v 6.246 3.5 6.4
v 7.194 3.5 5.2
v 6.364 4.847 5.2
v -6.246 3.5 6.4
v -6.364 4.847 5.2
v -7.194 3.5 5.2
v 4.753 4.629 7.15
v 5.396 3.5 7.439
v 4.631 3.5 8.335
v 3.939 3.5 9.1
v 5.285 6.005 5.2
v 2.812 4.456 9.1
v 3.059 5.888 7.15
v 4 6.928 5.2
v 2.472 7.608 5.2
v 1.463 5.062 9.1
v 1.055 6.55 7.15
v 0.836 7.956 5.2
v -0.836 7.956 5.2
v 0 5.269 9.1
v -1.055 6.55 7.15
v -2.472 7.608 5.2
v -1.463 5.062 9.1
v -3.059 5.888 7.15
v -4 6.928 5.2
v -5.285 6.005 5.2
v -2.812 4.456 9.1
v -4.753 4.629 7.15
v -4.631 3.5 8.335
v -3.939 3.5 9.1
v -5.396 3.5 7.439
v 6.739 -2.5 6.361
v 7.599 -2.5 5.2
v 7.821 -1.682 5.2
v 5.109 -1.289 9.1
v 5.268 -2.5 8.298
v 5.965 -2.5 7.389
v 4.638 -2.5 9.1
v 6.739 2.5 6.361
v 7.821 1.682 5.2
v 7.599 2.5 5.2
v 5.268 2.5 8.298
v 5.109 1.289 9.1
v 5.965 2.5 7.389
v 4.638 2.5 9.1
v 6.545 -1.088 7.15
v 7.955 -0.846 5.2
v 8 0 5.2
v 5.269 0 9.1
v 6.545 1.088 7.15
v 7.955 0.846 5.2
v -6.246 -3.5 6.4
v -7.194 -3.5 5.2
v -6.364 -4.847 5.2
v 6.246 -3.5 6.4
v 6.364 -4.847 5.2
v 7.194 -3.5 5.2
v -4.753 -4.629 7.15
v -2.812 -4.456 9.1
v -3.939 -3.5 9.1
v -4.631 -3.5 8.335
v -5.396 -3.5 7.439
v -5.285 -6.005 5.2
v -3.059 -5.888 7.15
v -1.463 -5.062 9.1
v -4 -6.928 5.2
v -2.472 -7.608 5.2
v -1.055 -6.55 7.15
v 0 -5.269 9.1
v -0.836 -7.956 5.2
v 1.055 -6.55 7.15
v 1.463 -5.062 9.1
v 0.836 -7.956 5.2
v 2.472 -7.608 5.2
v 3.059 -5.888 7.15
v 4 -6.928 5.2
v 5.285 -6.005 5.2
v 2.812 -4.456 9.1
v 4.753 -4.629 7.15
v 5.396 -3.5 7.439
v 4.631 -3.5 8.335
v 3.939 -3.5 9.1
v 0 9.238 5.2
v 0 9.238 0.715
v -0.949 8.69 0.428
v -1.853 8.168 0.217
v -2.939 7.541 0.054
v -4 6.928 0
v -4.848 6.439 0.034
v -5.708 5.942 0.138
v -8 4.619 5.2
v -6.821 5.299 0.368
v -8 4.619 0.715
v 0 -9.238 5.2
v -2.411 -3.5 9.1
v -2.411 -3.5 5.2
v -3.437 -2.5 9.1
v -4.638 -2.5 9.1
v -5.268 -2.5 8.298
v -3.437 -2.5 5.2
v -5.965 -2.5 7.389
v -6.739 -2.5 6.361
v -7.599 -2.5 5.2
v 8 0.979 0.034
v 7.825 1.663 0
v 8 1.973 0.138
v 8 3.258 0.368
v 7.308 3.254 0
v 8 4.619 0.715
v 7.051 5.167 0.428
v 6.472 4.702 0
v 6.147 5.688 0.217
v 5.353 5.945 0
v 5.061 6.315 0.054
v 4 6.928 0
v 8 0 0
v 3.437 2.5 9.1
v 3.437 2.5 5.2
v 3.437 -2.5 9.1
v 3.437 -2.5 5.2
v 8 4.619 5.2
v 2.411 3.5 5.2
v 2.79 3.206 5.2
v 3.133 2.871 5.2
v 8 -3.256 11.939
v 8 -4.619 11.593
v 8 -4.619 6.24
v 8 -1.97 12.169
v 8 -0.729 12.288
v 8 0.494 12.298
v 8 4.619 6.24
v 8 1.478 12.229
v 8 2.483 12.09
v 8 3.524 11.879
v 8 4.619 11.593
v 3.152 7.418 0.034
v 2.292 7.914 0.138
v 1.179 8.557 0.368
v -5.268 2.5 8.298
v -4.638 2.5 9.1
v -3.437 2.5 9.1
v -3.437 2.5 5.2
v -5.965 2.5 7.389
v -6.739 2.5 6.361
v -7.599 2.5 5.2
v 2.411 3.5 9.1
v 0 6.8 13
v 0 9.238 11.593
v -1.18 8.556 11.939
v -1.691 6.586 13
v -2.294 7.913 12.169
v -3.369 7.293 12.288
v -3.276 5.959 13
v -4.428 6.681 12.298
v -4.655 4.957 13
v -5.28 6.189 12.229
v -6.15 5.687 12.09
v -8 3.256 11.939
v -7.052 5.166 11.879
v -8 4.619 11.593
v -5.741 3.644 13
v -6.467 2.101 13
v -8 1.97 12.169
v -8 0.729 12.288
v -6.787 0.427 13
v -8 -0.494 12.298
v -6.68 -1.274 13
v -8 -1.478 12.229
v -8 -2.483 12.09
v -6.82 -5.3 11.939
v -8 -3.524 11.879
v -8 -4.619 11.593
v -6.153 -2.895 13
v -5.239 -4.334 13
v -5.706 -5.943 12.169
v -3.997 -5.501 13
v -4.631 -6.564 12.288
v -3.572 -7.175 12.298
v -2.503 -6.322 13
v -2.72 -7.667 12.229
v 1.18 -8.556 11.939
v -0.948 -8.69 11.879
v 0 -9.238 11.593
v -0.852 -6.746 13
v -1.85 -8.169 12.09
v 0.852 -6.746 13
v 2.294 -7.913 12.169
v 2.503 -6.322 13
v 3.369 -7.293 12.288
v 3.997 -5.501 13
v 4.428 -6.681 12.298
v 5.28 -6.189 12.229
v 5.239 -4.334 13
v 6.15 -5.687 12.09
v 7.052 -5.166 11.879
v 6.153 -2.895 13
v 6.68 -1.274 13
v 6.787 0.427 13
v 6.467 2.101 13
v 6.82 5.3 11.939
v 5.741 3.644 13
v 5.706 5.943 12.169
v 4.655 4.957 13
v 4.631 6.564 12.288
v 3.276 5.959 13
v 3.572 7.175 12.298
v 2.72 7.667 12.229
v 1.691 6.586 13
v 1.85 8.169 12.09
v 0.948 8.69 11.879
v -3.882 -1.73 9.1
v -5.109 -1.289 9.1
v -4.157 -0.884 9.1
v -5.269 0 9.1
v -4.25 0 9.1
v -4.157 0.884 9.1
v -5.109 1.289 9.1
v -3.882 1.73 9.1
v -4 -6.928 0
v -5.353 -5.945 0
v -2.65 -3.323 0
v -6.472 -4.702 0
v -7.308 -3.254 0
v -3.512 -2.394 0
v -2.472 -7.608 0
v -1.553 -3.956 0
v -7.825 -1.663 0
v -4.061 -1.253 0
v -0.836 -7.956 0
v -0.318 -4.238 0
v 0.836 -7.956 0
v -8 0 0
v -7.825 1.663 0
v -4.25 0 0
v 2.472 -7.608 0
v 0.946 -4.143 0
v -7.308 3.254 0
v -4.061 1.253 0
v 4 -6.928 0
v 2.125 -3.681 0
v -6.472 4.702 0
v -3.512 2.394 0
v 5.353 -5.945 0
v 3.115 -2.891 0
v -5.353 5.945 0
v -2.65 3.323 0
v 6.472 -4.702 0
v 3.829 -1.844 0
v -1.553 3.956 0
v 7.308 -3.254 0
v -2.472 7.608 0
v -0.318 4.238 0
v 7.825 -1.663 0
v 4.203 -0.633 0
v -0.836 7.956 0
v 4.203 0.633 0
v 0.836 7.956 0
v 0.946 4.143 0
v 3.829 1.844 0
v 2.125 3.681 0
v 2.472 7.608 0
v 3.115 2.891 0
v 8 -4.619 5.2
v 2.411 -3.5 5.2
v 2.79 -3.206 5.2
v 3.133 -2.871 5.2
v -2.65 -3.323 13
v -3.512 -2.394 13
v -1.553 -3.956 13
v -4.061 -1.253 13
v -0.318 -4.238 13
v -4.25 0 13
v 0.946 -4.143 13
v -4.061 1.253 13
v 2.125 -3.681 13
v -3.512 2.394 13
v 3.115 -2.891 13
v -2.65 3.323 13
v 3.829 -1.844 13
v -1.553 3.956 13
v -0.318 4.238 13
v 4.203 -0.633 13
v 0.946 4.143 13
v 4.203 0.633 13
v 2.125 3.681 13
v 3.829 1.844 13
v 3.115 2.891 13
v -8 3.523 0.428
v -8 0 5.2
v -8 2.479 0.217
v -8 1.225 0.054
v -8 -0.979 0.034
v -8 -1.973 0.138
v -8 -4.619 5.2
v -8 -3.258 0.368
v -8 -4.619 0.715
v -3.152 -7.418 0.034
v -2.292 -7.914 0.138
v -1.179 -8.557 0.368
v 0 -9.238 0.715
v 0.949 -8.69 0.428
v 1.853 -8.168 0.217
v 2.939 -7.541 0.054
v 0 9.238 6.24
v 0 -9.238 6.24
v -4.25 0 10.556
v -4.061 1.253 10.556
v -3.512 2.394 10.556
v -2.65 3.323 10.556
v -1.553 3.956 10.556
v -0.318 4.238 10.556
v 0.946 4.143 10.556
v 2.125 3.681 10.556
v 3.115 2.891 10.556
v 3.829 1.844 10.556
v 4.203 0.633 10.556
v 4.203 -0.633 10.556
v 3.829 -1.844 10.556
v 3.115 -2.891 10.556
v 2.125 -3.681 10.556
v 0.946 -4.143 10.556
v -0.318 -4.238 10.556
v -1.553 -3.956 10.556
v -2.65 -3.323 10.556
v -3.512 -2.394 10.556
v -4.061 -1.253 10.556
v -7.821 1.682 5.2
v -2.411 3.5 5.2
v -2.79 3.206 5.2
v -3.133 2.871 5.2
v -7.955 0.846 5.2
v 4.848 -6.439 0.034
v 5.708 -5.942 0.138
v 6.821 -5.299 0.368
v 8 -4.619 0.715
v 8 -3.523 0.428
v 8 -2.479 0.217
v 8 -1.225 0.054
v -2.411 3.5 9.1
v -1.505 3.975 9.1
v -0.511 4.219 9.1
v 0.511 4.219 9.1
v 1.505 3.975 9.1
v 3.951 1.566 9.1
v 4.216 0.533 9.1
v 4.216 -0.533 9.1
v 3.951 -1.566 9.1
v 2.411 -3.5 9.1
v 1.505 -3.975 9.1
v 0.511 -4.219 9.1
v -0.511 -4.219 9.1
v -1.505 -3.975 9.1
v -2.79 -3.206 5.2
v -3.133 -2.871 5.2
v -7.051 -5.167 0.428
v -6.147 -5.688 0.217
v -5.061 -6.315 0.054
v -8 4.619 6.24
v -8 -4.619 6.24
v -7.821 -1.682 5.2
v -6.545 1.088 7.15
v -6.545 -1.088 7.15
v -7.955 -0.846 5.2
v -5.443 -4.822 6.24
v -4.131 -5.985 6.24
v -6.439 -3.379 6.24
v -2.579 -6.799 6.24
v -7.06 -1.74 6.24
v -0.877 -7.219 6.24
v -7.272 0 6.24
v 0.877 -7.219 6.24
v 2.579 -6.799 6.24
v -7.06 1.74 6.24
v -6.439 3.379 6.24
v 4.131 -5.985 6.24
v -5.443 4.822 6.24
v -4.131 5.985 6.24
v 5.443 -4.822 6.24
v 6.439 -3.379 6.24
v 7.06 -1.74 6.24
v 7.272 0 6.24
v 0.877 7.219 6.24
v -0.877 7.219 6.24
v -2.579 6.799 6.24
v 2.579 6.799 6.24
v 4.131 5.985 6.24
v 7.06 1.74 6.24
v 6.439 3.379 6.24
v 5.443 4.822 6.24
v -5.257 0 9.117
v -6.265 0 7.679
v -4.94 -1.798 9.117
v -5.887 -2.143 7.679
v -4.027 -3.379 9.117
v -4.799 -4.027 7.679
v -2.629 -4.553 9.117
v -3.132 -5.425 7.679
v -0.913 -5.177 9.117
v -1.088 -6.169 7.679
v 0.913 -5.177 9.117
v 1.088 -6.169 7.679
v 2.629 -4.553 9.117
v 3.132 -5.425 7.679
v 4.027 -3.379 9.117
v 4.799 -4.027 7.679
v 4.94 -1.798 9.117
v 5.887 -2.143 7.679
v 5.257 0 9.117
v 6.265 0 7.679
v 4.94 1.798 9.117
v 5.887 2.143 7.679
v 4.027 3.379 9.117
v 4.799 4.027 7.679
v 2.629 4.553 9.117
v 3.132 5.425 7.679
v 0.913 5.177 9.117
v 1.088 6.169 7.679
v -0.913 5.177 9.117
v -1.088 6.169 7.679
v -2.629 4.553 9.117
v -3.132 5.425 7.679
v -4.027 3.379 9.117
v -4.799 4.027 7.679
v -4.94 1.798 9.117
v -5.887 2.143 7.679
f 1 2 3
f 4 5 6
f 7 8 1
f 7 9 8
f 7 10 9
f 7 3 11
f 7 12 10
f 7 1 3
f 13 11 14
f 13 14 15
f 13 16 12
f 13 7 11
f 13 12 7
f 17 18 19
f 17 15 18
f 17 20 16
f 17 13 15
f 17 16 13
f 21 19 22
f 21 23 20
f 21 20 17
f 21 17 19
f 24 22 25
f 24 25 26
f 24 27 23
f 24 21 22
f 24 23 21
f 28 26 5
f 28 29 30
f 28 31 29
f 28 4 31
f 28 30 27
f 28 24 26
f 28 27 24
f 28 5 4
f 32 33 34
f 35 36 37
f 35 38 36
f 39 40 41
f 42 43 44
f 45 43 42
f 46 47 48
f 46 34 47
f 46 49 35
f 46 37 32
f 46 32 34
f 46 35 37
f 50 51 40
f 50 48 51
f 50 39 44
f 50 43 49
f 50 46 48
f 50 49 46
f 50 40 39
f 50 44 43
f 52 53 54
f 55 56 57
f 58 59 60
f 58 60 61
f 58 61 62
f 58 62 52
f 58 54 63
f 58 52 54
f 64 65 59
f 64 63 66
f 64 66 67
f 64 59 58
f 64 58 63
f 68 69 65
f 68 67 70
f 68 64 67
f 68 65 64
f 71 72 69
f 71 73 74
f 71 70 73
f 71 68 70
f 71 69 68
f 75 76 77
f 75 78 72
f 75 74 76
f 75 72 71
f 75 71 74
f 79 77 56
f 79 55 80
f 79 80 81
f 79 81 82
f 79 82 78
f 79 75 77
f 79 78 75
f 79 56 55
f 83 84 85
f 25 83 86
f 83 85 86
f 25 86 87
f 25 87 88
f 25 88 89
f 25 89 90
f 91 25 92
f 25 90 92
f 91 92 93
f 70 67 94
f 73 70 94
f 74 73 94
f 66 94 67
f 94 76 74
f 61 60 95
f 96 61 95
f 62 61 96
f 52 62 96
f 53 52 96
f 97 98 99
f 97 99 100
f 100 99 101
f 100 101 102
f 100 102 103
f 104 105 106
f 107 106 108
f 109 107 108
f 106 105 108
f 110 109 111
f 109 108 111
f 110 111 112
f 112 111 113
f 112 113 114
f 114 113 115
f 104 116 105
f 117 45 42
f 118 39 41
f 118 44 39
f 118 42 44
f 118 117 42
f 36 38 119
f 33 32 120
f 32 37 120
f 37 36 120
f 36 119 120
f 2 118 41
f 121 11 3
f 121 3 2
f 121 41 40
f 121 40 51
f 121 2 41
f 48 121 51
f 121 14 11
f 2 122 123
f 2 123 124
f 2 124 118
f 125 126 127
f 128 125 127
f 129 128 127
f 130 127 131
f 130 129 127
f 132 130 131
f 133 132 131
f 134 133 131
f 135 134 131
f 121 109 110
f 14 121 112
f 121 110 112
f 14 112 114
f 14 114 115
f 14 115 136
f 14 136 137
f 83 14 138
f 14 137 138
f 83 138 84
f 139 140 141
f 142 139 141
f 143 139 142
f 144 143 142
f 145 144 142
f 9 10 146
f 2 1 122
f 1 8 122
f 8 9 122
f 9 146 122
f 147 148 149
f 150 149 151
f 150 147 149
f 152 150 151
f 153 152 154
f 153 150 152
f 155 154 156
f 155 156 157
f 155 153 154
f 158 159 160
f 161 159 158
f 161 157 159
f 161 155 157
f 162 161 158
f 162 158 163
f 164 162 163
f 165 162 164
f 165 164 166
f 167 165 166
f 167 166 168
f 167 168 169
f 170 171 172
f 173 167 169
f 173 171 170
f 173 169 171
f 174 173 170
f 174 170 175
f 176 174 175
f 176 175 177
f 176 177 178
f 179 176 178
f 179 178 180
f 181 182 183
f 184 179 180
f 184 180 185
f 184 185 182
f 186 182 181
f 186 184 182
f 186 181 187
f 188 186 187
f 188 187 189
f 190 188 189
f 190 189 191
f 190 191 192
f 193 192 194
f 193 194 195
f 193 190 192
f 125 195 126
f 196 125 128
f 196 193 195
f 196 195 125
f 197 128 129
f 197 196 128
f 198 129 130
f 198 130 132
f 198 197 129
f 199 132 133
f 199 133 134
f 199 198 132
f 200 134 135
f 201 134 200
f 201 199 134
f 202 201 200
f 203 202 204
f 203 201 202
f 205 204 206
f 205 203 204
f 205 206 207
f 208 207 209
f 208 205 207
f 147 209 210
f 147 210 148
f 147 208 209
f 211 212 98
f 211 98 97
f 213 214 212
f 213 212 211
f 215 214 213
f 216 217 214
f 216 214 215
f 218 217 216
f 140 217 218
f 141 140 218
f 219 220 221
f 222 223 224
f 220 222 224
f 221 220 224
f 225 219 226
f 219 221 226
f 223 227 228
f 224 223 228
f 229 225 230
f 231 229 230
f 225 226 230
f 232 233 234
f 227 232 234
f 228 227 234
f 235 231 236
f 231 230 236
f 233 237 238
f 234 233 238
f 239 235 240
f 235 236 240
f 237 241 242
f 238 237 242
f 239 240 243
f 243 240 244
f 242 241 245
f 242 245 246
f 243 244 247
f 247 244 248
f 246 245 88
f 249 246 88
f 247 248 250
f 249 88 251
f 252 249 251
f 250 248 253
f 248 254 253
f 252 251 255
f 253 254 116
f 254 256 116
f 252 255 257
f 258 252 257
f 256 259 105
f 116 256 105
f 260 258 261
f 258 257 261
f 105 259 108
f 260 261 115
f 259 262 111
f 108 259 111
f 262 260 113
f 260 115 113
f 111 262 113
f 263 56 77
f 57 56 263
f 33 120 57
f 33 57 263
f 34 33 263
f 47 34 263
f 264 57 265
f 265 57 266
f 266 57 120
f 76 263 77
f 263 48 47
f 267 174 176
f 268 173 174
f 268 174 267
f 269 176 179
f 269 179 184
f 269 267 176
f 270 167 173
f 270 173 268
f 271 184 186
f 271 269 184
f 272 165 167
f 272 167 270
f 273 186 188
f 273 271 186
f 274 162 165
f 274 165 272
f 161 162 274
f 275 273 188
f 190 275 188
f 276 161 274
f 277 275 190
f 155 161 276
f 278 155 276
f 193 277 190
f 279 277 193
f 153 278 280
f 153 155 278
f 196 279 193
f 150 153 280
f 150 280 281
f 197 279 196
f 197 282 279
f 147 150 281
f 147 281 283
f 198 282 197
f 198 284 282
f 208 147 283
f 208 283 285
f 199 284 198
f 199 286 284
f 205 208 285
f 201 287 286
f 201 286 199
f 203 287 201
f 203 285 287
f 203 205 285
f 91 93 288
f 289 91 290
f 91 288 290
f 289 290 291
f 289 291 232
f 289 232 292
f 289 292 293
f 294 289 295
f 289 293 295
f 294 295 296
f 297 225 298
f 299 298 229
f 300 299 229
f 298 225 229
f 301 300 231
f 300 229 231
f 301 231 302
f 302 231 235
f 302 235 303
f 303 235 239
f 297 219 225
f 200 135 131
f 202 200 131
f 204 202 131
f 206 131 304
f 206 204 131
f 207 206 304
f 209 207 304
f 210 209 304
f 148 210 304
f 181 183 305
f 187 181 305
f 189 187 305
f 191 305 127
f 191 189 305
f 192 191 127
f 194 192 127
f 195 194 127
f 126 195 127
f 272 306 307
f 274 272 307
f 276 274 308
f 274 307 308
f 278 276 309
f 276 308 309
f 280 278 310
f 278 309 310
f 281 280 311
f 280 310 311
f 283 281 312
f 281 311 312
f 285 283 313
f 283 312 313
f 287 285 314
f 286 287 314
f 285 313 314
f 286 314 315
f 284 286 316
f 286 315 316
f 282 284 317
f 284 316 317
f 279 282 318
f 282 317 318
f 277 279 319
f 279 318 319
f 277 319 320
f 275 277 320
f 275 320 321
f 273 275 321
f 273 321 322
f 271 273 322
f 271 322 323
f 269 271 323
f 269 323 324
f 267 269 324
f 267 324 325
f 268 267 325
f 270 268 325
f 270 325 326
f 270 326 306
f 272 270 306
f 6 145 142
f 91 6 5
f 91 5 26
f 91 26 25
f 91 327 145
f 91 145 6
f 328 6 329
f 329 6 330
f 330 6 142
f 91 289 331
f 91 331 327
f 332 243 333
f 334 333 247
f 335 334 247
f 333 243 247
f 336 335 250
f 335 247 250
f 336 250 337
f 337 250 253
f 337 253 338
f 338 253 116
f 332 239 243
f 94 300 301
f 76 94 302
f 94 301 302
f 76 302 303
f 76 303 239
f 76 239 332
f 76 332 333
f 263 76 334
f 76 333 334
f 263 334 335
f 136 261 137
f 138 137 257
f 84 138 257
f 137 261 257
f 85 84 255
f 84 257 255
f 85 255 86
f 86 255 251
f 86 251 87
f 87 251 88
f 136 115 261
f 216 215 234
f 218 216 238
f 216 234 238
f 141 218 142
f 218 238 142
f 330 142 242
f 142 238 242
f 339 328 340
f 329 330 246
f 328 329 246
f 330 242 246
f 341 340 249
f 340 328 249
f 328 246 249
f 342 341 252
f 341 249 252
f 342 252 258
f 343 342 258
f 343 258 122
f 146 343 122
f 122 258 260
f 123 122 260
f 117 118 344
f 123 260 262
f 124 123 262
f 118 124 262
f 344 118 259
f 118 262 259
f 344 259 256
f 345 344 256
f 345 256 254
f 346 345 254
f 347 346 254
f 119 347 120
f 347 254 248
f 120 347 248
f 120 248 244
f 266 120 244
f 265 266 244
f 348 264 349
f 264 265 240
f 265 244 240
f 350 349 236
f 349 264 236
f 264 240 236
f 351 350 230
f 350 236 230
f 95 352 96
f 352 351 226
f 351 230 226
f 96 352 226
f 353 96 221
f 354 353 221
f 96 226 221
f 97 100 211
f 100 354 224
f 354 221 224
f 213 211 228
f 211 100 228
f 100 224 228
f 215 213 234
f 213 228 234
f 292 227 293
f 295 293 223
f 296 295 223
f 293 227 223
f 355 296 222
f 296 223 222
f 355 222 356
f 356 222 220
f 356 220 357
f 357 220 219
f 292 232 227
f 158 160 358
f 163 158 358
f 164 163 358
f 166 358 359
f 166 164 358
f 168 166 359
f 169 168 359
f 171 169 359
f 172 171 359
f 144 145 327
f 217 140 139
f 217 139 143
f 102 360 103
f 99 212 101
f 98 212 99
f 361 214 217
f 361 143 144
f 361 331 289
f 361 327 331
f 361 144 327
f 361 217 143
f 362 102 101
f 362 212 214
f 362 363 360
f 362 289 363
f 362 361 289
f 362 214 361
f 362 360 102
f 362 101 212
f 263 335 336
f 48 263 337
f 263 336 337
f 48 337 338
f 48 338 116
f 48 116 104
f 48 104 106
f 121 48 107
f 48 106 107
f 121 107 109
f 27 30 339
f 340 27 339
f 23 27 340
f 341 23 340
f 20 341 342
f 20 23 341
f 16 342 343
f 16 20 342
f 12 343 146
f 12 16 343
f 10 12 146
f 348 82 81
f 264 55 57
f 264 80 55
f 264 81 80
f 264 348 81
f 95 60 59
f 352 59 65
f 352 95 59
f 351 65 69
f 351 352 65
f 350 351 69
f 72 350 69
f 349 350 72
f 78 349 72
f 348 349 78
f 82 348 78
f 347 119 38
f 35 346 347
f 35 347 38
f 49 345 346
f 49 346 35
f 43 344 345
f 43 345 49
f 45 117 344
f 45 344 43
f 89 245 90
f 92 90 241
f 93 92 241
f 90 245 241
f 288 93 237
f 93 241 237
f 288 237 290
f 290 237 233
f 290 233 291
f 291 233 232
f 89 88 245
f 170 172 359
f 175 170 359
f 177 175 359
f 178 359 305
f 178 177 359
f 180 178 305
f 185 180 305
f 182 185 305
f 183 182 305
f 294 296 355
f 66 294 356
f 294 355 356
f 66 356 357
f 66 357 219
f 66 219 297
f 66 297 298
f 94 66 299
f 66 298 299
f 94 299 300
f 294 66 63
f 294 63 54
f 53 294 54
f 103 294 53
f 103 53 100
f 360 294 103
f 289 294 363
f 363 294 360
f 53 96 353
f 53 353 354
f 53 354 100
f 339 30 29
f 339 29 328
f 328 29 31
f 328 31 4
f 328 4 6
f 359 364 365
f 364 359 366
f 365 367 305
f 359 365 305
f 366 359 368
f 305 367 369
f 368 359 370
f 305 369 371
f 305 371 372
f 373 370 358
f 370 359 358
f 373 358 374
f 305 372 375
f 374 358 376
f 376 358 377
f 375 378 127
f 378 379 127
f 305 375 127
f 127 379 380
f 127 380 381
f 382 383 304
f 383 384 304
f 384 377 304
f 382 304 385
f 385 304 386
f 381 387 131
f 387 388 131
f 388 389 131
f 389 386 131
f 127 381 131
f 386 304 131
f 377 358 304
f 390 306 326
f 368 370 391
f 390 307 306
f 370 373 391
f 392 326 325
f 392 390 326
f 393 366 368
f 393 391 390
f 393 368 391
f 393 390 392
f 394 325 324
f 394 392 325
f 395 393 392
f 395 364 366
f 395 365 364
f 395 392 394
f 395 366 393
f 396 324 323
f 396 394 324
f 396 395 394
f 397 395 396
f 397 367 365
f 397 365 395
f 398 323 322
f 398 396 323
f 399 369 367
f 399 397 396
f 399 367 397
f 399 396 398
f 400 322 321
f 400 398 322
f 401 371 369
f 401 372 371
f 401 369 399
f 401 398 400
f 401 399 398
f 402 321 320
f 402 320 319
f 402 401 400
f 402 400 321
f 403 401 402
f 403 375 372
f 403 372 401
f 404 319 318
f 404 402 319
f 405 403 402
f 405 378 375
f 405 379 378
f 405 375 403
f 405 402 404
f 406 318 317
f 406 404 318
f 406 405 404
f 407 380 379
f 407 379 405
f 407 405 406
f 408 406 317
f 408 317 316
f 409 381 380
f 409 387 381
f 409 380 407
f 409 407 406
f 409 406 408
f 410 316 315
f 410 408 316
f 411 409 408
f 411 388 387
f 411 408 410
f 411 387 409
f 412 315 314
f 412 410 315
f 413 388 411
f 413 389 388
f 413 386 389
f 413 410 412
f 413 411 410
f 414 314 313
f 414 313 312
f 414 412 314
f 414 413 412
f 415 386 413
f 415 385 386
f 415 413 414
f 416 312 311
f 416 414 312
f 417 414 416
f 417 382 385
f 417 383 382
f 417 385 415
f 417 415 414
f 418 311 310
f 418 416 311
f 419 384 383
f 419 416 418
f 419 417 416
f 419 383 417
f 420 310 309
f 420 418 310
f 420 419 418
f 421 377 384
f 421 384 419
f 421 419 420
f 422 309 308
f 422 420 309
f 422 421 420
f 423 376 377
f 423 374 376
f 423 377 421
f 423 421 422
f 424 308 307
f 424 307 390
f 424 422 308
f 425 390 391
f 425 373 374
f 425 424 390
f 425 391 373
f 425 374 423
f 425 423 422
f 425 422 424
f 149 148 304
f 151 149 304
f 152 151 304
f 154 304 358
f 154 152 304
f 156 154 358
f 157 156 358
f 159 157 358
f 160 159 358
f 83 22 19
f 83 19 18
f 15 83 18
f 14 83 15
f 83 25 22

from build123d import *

# Parameters (mm, degrees)
VYSUNOUT1_DEPTH               = 5.2
SKICA2_R                      = 8
VYSUNOUT2_DEPTH               = 3.9
VYSUNOUT2_TAPER               = 35
VYSUNOUT3_DEPTH               = 6.76
SKICA4_R                      = 4.25
ODEBRAT_VYSUNUT_M1_DEPTH      = 18.841898255
ODEBRAT_VYSUNUT_M2_DEPTH      = 18.841898255
ODEBRAT_VYSUNUT_M2_DEPTH_BACK = 18.841898255
SKICA9_W                      = 3.9
SKICA9_H                      = 1


with BuildPart() as part:
    # Skica1 → Vysunout1 (new body)
    with BuildSketch(Plane.XY):
        Polygon((0, 9.237604307), (-8, 4.618802154), (-8, -4.618802154), (0, -9.237604307), (8, -4.618802154), (8, 4.618802154), align=None)
    extrude(amount=VYSUNOUT1_DEPTH)

    # Skica2 → Vysunout2 (add)
    with BuildSketch(Plane.XY.offset(5.2)):
        Circle(SKICA2_R)
    extrude(amount=VYSUNOUT2_DEPTH, taper=VYSUNOUT2_TAPER)


with BuildPart() as body_2:
    # Skica3 → Vysunout3 (new body)
    with BuildSketch(Plane.XY.offset(13)):
        Polygon((8, 4.618802154), (0, 9.237604307), (-8, 4.618802154), (-8, -4.618802154), (0, -9.237604307), (8, -4.618802154), align=None)
    extrude(amount=-VYSUNOUT3_DEPTH)


with BuildPart() as odebrat_vysunut_m1_tool:
    # Skica4 → Odebrat vysunutím1 (new, through all)
    with BuildSketch(Plane(origin=(0, 0, 0), x_dir=(-1, 0, 0), z_dir=(0, 0, -1))):
        Circle(SKICA4_R)
    extrude(amount=-ODEBRAT_VYSUNUT_M1_DEPTH)


with BuildPart() as part_1:
    add(part.part)

    # Odebrat vysunutím1: cut by odebrat_vysunut_m1_tool
    add(odebrat_vysunut_m1_tool.part, mode=Mode.SUBTRACT)

    # Skica8 → Odebrat rotací3 (revolve, cut)
    with BuildSketch(Plane(origin=(0, 0, 0), x_dir=(0, 0, -1), z_dir=(1, 0, 0))):
        Polygon((-0.71453118, 9.237604307), (0, 8), (0, 9.237604307), align=None)
    revolve(axis=Axis((0, 0, 0), (0, 0, 1)), mode=Mode.SUBTRACT)

    # Skica9 → Odebrat vysunutím2 (cut, two sides: drawn at the far end of the back side and taken through both)
    with BuildSketch(Plane(origin=(0, 0, 0), x_dir=(0, 0, -1), z_dir=(1, 0, 0)).offset(-ODEBRAT_VYSUNUT_M2_DEPTH_BACK)):
        with Locations((-7.15, 3)):
            Rectangle(SKICA9_W, SKICA9_H)
        with Locations((-7.15, -3)):
            Rectangle(SKICA9_W, SKICA9_H)
    extrude(amount=ODEBRAT_VYSUNUT_M2_DEPTH + ODEBRAT_VYSUNUT_M2_DEPTH_BACK, mode=Mode.SUBTRACT)


with BuildPart() as body_2_1:
    add(body_2.part)

    # Odebrat vysunutím1: cut by odebrat_vysunut_m1_tool
    add(odebrat_vysunut_m1_tool.part, mode=Mode.SUBTRACT)

    # Skica5 → Odebrat rotací1 (revolve, cut)
    with BuildSketch(Plane(origin=(0, 0, 0), x_dir=(1, 0, 0), z_dir=(0, 1, 0)), mode=Mode.PRIVATE) as odebrat_rotac_1_sk:
        Polygon((0, -6.24), (0, -10.555555025), (4.25, -10.555555025), (7.27178416, -6.24), align=None)
    revolve(odebrat_rotac_1_sk.sketch.rotate(Axis((0, 0, 0), (0, 0, 1)), 180), axis=Axis((0, 0, 0), (0, 0, 1)), mode=Mode.SUBTRACT)

    # Skica7 → Odebrat rotací2 (revolve, cut)
    with BuildSketch(Plane(origin=(0, 0, 0), x_dir=(0, 0, -1), z_dir=(1, 0, 0))):
        Polygon((-11.592648497, 9.237604307), (-13, 6.8), (-13, 9.237604307), align=None)
    revolve(axis=Axis((0, 0, 0), (0, 0, 1)), mode=Mode.SUBTRACT)


solid = Compound([part_1.part, body_2_1.part])
